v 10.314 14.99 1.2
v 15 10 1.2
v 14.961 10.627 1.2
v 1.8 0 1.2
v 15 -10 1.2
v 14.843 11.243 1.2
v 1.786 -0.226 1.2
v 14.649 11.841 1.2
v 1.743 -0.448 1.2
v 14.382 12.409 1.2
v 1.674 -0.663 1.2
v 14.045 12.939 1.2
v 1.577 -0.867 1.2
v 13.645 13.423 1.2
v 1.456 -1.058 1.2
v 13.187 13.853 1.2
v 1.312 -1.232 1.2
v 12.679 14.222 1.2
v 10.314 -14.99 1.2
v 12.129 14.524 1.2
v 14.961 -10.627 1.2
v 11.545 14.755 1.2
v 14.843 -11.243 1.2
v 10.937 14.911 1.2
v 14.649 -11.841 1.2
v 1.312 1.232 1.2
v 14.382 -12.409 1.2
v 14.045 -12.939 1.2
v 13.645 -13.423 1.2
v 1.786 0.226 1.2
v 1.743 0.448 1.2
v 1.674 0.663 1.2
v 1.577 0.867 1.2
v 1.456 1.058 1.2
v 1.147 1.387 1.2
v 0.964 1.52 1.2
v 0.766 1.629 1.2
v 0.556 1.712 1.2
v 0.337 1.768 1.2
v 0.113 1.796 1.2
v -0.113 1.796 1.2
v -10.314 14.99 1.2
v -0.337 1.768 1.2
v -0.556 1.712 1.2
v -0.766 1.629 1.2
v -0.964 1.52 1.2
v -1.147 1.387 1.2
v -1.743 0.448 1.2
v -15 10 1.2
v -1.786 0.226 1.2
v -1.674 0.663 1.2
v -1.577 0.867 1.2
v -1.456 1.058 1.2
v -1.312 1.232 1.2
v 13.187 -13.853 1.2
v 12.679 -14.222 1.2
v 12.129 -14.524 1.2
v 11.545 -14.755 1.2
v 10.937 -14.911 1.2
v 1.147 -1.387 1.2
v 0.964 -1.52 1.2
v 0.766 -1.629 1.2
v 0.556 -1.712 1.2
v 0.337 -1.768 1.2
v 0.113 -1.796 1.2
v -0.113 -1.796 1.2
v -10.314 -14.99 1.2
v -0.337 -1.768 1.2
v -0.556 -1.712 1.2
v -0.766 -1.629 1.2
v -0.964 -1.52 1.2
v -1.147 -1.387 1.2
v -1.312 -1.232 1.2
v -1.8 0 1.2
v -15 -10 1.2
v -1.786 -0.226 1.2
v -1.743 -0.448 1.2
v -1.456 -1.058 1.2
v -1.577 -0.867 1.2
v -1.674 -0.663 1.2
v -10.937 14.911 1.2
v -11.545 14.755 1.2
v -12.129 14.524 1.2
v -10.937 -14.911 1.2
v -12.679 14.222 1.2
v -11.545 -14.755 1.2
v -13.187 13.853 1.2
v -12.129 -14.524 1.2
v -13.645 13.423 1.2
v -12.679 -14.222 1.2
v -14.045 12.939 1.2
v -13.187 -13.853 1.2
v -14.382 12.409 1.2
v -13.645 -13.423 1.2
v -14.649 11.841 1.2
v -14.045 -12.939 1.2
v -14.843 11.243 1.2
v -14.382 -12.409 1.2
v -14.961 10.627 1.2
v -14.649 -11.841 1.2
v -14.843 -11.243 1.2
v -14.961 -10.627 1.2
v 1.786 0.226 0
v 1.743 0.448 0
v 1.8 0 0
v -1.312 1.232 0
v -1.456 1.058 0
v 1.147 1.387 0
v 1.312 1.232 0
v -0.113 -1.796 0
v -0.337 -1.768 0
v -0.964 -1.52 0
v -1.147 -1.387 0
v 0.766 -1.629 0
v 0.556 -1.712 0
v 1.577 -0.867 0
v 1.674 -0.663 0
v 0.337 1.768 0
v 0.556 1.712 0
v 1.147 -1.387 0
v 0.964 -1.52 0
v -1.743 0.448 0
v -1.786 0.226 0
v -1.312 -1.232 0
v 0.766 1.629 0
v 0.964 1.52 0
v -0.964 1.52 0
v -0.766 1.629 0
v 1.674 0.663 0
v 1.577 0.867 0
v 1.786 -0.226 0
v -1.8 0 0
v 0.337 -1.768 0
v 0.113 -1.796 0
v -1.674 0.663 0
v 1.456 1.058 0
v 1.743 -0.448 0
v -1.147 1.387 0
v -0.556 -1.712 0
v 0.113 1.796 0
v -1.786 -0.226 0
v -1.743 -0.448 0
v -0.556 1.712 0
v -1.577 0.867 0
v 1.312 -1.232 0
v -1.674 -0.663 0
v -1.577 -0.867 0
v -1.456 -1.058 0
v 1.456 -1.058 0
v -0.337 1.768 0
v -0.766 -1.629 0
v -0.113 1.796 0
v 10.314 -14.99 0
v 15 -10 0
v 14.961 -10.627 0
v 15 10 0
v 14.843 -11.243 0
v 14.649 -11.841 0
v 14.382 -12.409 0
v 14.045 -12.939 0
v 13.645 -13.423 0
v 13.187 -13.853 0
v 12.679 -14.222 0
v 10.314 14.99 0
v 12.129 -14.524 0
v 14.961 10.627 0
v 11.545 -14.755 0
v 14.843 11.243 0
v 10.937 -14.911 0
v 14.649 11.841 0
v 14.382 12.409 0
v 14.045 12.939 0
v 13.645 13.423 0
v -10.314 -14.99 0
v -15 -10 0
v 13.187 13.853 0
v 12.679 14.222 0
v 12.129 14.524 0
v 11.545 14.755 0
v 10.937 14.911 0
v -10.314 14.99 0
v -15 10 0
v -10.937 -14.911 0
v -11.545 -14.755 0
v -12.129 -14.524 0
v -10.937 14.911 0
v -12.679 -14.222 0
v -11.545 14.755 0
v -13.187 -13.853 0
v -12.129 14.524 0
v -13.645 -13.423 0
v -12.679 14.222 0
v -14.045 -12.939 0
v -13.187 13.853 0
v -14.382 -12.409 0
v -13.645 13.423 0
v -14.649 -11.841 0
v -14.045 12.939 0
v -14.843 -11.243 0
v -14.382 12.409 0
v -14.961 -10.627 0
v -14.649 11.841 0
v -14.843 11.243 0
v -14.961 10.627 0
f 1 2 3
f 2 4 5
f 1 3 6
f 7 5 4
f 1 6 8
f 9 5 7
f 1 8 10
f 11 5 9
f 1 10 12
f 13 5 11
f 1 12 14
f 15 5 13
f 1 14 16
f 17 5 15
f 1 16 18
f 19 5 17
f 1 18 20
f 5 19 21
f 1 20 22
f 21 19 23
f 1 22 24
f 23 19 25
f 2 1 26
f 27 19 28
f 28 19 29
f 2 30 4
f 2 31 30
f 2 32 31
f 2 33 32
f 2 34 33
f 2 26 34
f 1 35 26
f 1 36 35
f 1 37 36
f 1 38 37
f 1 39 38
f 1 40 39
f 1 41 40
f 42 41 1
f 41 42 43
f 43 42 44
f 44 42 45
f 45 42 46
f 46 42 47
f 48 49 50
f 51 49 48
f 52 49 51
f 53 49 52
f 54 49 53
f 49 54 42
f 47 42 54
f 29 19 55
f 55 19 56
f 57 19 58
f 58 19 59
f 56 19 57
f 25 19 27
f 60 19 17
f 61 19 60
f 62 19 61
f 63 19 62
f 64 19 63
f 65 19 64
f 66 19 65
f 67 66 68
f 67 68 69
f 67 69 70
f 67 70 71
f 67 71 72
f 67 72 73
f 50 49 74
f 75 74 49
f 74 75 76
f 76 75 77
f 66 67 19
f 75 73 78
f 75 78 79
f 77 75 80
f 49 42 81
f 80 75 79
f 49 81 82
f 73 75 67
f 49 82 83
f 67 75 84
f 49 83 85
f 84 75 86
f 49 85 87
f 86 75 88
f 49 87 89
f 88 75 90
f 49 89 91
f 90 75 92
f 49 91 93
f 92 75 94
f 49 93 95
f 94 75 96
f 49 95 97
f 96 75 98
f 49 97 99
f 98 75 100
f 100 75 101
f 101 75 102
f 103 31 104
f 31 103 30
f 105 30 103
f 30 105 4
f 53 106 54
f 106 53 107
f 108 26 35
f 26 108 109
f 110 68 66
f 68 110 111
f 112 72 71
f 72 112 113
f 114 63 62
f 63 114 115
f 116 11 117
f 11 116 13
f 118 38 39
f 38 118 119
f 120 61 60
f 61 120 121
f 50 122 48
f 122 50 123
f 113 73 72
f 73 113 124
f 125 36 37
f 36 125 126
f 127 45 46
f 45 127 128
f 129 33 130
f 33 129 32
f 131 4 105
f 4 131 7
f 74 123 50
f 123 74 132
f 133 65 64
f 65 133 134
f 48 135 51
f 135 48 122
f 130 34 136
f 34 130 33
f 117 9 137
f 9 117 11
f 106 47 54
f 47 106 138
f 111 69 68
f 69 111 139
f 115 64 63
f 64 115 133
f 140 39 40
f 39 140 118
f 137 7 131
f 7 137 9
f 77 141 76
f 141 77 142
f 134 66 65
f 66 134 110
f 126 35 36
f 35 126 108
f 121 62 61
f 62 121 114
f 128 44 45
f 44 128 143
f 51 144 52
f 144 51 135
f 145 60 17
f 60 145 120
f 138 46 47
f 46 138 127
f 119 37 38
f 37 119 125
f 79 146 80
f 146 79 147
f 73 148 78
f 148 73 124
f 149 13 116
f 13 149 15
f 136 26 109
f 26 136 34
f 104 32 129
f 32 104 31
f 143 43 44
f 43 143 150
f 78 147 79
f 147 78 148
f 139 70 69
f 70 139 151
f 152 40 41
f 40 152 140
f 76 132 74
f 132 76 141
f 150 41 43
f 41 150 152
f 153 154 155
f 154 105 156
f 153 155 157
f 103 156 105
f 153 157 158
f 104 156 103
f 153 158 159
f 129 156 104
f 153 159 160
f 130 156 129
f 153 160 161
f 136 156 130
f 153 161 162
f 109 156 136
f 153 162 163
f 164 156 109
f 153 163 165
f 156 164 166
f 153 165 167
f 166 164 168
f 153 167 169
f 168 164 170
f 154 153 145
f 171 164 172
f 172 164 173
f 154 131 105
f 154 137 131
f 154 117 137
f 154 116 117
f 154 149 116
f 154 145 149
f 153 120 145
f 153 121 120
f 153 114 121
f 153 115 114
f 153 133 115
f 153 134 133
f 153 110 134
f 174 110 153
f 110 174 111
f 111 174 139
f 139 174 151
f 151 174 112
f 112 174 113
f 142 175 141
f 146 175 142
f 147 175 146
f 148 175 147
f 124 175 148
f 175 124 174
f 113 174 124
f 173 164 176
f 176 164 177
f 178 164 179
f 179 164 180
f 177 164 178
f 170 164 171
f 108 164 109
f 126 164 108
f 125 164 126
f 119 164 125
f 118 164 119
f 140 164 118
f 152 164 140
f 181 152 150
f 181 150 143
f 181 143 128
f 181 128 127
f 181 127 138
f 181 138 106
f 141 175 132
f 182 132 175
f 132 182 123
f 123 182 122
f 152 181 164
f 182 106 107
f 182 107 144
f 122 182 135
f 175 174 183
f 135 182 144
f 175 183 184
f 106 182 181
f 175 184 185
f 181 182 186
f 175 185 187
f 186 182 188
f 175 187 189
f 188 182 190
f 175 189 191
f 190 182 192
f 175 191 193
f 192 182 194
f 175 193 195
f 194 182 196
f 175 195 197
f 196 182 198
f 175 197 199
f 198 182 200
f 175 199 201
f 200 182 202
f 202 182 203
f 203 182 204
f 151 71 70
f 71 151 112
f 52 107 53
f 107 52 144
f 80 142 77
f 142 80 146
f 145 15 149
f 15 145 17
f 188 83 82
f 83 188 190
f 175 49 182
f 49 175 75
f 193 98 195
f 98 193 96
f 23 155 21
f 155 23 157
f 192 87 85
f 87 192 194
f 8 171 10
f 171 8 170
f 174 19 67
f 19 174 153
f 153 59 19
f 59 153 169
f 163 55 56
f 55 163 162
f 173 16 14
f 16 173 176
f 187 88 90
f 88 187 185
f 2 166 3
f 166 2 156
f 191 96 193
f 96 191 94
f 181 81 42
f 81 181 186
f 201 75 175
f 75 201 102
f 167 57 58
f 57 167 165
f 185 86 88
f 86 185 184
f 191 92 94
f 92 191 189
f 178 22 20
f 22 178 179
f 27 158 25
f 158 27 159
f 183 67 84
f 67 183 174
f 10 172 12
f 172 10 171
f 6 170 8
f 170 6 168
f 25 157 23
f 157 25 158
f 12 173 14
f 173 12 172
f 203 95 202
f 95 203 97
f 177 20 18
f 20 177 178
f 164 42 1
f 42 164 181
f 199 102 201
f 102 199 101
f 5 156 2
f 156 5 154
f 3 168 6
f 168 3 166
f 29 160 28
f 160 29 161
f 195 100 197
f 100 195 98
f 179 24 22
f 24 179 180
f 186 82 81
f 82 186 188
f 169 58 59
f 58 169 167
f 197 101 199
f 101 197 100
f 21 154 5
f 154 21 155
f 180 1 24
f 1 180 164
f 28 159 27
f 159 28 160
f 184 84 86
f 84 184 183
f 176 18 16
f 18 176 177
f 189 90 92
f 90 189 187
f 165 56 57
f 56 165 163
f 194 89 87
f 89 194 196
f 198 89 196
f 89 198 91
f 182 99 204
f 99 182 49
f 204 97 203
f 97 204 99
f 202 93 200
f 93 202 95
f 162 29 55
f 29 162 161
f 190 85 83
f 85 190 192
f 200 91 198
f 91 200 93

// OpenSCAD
$fn = 50;


difference() {
	union() {
		hull() {
			translate(v = [-10.0000000000, 10.0000000000, 0]) {
				cylinder(h = 90, r = 5);
			}
			translate(v = [10.0000000000, 10.0000000000, 0]) {
				cylinder(h = 90, r = 5);
			}
			translate(v = [-10.0000000000, -10.0000000000, 0]) {
				cylinder(h = 90, r = 5);
			}
			translate(v = [10.0000000000, -10.0000000000, 0]) {
				cylinder(h = 90, r = 5);
			}
		}
	}
	union() {
		translate(v = [0, 0, 1.2000000000]) {
			hull() {
				translate(v = [-10.0000000000, 10.0000000000, 0]) {
					cylinder(h = 88.8000000000, r = 3.8000000000);
				}
				translate(v = [10.0000000000, 10.0000000000, 0]) {
					cylinder(h = 88.8000000000, r = 3.8000000000);
				}
				translate(v = [-10.0000000000, -10.0000000000, 0]) {
					cylinder(h = 88.8000000000, r = 3.8000000000);
				}
				translate(v = [10.0000000000, -10.0000000000, 0]) {
					cylinder(h = 88.8000000000, r = 3.8000000000);
				}
			}
		}
		#cylinder(h = 1.2000000000, r = 1.8000000000);
		translate(v = [-250.0000000000, -250.0000000000, 1.2000000000]) {
			cube(size = [500, 500, 500]);
		}
		translate(v = [-250.0000000000, -250.0000000000, 1.2000000000]) {
			cube(size = [500, 500, 500]);
		}
		translate(v = [-250.0000000000, -250.0000000000, 1.2000000000]) {
			cube(size = [500, 500, 500]);
		}
	}
}
